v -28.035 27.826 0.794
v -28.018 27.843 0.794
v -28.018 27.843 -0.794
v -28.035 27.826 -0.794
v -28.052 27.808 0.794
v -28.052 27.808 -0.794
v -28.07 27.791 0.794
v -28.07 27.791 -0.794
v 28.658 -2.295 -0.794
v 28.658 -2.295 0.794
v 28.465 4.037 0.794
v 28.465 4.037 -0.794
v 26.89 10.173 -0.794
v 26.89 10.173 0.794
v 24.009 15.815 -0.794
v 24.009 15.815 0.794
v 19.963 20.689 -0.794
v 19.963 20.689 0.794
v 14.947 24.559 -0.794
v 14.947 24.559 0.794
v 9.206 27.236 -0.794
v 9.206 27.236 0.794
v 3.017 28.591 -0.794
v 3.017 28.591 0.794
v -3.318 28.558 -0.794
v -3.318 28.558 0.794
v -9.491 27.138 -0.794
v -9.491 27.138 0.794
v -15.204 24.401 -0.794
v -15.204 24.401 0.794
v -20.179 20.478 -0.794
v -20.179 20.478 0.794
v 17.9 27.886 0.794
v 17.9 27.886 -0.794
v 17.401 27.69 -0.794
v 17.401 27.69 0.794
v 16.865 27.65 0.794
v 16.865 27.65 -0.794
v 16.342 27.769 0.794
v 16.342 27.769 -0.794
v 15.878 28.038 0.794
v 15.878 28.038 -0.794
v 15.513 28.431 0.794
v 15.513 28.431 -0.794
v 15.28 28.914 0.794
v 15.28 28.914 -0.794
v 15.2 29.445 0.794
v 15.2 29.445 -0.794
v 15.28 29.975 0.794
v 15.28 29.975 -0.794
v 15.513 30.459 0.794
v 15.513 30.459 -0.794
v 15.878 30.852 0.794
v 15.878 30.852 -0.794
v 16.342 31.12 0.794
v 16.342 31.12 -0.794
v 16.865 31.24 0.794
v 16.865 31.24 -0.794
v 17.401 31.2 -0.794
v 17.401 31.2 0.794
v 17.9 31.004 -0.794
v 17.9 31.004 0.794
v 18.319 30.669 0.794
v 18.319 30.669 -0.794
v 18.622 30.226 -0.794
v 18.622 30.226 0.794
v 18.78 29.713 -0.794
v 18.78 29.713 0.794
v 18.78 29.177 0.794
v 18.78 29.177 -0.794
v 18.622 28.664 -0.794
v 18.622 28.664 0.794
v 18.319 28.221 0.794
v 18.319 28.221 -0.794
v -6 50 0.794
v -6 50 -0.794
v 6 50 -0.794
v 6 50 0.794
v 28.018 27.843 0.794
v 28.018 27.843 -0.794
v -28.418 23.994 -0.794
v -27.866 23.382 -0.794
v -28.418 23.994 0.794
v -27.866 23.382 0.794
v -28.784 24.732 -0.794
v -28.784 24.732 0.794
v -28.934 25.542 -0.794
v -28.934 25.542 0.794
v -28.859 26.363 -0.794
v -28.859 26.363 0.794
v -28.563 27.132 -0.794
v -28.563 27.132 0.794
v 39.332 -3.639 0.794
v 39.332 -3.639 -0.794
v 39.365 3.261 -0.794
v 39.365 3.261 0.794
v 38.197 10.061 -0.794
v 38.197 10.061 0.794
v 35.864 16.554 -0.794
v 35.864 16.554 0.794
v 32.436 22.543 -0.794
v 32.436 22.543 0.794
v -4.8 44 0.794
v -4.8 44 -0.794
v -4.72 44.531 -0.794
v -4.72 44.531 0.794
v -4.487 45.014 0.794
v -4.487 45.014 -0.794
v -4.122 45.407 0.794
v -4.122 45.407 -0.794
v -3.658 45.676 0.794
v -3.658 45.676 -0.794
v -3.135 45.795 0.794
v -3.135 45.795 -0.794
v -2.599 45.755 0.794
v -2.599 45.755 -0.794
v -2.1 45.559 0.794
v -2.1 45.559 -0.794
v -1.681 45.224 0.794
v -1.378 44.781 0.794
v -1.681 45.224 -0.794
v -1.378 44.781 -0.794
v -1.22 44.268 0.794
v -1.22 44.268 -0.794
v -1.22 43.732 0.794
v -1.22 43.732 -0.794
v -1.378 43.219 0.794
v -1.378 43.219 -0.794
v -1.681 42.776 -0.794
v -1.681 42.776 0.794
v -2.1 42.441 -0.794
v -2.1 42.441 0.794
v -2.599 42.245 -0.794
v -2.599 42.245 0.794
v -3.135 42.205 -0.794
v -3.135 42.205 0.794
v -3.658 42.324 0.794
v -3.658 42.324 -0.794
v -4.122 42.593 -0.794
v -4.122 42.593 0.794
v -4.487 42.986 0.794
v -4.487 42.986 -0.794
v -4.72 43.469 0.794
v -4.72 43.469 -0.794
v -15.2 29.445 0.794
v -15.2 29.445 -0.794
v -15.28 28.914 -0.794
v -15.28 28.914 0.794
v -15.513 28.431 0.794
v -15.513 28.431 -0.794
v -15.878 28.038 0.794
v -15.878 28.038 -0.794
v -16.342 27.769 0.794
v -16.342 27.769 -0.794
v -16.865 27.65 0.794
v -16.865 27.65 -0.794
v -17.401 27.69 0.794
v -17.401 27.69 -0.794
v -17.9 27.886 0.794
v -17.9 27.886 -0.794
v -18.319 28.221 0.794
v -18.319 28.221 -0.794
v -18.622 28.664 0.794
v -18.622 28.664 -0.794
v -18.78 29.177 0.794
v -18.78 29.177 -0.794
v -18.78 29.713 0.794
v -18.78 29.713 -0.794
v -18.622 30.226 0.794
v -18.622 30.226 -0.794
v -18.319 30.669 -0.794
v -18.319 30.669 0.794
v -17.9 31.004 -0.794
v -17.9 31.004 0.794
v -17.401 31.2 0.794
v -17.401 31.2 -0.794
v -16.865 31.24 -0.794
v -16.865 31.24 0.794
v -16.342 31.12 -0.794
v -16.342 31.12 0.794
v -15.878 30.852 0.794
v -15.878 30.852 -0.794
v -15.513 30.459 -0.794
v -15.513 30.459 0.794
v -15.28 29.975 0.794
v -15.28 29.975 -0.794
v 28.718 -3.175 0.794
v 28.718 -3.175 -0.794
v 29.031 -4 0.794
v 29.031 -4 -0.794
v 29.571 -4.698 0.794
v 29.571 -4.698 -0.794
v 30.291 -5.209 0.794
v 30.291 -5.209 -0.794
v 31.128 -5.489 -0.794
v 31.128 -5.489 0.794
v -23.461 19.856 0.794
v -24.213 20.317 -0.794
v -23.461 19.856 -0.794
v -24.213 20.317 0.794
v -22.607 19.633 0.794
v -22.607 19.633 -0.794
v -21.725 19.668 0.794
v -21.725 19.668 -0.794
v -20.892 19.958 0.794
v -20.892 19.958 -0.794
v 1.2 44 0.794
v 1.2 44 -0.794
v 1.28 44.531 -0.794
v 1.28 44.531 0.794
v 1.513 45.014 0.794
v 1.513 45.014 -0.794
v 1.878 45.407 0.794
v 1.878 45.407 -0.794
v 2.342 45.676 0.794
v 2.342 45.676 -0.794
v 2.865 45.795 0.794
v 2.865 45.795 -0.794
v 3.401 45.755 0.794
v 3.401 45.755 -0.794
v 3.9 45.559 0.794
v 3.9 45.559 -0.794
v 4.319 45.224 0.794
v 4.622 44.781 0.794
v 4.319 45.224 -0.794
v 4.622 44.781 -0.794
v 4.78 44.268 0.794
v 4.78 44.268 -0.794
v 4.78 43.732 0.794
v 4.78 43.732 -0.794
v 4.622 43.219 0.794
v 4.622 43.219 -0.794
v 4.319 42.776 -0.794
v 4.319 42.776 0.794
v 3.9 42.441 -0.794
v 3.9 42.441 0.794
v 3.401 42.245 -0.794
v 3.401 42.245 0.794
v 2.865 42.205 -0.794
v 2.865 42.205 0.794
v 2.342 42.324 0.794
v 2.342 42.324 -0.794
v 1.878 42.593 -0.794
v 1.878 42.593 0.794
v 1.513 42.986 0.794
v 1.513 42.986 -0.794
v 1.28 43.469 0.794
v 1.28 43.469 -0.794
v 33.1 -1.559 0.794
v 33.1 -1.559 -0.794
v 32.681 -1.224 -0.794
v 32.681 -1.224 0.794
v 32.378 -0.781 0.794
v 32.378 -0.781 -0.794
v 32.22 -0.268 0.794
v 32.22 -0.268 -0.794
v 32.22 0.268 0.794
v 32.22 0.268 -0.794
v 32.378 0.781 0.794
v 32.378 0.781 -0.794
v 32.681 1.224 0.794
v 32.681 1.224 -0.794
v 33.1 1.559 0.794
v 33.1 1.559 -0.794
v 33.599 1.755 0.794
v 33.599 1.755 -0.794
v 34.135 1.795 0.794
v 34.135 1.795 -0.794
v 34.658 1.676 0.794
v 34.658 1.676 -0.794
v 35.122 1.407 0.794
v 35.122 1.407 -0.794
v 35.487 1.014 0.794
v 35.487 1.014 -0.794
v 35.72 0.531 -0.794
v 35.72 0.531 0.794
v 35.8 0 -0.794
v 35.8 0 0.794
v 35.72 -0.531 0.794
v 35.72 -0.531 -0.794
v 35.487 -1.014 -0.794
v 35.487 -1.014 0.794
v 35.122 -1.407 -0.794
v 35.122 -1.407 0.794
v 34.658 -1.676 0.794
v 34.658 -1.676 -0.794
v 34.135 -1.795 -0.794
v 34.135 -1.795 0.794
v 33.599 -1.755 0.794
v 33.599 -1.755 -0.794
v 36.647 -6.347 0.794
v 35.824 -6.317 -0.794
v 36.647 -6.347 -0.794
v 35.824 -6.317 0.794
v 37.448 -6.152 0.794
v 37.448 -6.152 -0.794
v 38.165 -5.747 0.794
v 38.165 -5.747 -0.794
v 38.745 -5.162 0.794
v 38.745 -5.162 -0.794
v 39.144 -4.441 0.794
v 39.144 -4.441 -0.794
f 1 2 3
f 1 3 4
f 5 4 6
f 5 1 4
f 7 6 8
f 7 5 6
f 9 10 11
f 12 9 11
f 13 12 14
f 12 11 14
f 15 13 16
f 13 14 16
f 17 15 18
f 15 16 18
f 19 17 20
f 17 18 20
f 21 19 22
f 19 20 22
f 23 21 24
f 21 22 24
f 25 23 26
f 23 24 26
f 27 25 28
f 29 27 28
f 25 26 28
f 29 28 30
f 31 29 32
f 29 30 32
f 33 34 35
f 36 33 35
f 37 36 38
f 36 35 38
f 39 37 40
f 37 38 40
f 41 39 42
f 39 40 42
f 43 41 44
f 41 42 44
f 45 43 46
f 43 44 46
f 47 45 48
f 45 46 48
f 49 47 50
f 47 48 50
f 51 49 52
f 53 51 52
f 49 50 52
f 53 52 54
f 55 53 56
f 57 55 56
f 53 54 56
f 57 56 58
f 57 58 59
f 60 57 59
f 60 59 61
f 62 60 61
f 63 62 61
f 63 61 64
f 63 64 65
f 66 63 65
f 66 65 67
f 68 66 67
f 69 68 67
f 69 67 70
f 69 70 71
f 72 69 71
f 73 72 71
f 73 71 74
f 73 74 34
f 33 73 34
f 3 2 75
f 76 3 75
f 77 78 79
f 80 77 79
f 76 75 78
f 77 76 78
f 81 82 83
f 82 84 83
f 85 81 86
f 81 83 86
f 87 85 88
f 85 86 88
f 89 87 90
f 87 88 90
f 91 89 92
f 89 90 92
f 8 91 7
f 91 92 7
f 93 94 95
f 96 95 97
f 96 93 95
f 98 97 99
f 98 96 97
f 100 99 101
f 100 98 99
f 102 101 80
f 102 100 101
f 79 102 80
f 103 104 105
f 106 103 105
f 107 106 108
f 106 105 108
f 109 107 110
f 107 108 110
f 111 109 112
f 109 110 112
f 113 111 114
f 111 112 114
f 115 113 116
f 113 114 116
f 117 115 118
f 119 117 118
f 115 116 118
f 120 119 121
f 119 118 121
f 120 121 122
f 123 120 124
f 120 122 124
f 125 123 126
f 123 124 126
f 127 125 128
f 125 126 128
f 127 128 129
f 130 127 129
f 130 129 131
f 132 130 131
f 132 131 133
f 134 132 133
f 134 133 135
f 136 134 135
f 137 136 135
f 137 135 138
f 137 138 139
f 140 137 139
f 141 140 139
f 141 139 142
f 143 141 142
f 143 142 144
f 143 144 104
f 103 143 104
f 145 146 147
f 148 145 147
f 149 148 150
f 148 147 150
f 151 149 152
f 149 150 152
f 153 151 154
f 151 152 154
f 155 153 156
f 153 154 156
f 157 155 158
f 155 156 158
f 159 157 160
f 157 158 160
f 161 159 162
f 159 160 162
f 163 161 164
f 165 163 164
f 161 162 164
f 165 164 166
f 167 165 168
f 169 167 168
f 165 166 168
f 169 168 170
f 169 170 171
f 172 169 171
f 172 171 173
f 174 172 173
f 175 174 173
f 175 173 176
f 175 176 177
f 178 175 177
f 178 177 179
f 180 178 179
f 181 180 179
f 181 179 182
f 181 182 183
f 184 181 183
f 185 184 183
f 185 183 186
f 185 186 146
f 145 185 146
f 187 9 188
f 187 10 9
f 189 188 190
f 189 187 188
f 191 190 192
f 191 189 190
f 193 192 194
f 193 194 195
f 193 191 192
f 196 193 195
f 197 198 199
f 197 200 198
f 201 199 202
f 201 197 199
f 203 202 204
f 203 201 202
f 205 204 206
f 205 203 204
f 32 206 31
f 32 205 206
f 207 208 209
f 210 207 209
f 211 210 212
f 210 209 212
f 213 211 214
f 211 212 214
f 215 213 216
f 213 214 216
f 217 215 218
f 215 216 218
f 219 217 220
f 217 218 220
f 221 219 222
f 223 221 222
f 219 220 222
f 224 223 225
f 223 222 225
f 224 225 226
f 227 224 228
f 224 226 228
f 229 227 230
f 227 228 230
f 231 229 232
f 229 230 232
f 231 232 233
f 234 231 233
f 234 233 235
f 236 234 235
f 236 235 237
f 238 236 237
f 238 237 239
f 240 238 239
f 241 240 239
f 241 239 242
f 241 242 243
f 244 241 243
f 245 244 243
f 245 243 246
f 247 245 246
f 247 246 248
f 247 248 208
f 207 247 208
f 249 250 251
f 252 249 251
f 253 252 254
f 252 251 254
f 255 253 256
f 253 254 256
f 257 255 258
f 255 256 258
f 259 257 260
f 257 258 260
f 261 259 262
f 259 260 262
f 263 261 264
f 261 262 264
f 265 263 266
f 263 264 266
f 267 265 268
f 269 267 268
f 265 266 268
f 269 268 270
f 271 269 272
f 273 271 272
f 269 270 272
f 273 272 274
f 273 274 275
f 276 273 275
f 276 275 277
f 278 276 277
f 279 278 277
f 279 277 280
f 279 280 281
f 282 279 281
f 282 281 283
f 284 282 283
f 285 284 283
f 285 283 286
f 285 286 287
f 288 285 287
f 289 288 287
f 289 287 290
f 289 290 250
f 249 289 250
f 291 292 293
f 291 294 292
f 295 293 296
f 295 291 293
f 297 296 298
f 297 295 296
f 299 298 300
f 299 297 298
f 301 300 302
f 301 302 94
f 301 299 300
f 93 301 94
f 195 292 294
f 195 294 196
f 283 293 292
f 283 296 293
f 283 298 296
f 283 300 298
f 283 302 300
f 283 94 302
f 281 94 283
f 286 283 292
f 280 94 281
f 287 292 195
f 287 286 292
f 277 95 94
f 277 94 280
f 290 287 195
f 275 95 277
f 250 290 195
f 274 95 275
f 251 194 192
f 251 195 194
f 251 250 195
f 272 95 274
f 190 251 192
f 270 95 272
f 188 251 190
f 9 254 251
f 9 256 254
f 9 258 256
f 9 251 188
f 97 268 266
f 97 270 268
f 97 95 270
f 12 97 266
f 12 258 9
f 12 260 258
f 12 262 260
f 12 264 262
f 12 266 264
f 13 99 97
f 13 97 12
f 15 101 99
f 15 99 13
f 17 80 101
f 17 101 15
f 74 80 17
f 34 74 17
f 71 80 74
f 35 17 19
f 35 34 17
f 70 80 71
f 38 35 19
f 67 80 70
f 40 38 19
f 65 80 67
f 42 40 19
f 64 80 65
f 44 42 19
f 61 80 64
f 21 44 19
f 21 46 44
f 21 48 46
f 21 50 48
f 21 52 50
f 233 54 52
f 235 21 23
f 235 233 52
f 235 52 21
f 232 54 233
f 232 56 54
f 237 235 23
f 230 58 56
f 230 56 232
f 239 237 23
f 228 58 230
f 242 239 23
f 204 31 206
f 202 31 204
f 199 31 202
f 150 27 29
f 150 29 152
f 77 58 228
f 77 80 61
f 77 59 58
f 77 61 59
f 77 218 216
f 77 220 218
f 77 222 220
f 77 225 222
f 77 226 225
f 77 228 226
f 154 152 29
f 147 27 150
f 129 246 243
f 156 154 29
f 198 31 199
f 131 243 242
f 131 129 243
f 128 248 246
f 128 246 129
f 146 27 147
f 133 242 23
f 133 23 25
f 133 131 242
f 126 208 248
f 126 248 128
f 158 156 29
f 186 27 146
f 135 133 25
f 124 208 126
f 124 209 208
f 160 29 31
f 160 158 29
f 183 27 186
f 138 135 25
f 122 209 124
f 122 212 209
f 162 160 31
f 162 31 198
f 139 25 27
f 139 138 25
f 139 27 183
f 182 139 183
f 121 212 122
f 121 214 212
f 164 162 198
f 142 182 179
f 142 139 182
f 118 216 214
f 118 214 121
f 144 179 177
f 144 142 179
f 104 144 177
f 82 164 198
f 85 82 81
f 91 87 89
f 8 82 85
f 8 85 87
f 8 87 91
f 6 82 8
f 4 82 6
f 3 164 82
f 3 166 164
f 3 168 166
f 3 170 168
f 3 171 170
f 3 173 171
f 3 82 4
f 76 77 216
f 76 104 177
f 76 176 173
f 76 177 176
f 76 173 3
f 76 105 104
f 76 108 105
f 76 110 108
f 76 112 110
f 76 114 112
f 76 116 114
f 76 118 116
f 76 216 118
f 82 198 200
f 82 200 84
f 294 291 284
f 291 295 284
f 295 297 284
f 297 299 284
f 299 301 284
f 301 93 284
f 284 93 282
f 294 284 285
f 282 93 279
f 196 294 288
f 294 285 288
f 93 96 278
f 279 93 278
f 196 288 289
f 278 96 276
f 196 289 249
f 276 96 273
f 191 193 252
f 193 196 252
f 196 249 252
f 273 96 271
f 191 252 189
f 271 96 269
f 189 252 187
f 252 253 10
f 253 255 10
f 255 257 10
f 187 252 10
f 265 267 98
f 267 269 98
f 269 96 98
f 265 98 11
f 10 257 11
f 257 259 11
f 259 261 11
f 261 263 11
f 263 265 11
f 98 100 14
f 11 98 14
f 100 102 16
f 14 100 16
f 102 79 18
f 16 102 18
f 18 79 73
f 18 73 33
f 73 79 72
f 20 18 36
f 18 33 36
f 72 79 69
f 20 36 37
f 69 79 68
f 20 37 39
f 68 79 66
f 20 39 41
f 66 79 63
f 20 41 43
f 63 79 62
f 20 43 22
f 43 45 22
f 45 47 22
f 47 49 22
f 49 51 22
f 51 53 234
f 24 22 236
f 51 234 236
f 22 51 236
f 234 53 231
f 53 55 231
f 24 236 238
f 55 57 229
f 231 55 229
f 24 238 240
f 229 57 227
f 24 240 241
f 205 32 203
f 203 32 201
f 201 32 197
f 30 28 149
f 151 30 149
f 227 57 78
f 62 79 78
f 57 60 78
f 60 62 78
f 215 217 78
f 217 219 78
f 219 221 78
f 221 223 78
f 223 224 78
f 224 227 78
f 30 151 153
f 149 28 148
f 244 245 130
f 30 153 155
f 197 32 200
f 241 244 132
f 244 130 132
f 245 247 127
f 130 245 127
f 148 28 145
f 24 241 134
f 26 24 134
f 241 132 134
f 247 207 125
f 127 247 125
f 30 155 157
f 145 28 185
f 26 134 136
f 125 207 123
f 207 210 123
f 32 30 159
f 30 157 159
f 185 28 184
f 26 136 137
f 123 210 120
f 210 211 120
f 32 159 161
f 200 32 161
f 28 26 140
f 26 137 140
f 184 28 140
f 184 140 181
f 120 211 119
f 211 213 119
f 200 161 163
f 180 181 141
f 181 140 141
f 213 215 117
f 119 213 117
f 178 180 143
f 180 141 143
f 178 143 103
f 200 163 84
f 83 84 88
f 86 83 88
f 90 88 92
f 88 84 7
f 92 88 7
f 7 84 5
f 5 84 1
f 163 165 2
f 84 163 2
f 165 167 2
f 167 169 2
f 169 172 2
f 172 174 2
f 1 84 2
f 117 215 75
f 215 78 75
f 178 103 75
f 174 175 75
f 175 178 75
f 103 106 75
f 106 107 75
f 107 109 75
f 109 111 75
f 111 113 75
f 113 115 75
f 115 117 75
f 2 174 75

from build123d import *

# Parameters (mm, degrees)
SKETCH1_R                = 39.5
BOSS_EXTRUDE1_DEPTH      = 0.79375
BOSS_EXTRUDE2_DEPTH      = 1.5875
SKETCH2_R                = 28.75
CUT_EXTRUDE1_DEPTH       = 64.739863165
M3_CLEARANCE_HOLE1_D     = 3.6
CIRPATTERN1_COUNT        = 6
M3_CLEARANCE_HOLE2_D     = 3.6
M3_CLEARANCE_HOLE2_DEPTH = 10
M3_CLEARANCE_HOLE2_TIP   = 1.081549114
CUT_EXTRUDE3_DEPTH       = 64.739863165
FILLET1_R                = 3


with BuildPart() as part:
    # Sketch1 → Boss-Extrude1 (new, symmetric)
    with BuildSketch(Plane.XY):
        Circle(SKETCH1_R)
    extrude(amount=BOSS_EXTRUDE1_DEPTH, both=True)

    # Sketch3 → Boss-Extrude2 (add, through all)
    with BuildSketch(Plane.XY.offset(0.79375)):
        Polygon((-28.01836343, 27.842796388), (-6, 50), (6, 50), (28.01836343, 27.842796388), align=None)
    extrude(amount=-BOSS_EXTRUDE2_DEPTH)

    # Sketch2 → Cut-Extrude1 (cut, through all)
    with BuildSketch(Plane.XY.offset(0.79375)):
        Circle(SKETCH2_R)
    extrude(amount=-CUT_EXTRUDE1_DEPTH, mode=Mode.SUBTRACT)

    # M3 Clearance Hole1 (through all)
    with Locations(Plane.XY.offset(0.79375)):
        with Locations((17, -29.444863729)):
            m3_clearance_hole1 = Hole(M3_CLEARANCE_HOLE1_D / 2)

    # CirPattern1: M3 Clearance Hole1 ×6 about axis
    cirpattern1_axis = Axis((0, 0, 0), (0, 0, 1))
    for i in range(1, CIRPATTERN1_COUNT):
        add(m3_clearance_hole1.rotate(cirpattern1_axis, i * 360 / CIRPATTERN1_COUNT), mode=Mode.SUBTRACT)

    # M3 Clearance Hole2
    with Locations(Plane.XY.offset(0.79375)):
        with Locations((3, 44), (-3, 44)):
            Hole(M3_CLEARANCE_HOLE2_D / 2, depth=M3_CLEARANCE_HOLE2_DEPTH)
            with Locations((0, 0, -(M3_CLEARANCE_HOLE2_DEPTH + M3_CLEARANCE_HOLE2_TIP / 2))):  # 118° drill point
                Cone(0, M3_CLEARANCE_HOLE2_D / 2, M3_CLEARANCE_HOLE2_TIP, mode=Mode.SUBTRACT)

    # OpenEdge → Cut-Extrude3 (cut, through all)
    with BuildSketch(Plane(origin=(0, 0, -0.79375), x_dir=(-1, 0, 0), z_dir=(0, 0, -1))):
        with BuildLine():
            Line((22.02377774, 18.480143778), (30.258755503, 25.390110583))
            ThreePointArc((30.258755503, 25.390110583), (16.693421339, -35.799157588), (-38.899906244, -6.859103018))
            Line((-38.899906244, -6.859103018), (-28.313222899, -4.992385108))
            ThreePointArc((-28.313222899, -4.992385108), (12.150275025, -26.056348877), (22.02377774, 18.480143778))
        make_face()
    extrude(amount=-CUT_EXTRUDE3_DEPTH, mode=Mode.SUBTRACT)

    # Fillet1
    fillet1_edges = [part.edges().sort_by_distance(p)[0] for p in [
        (28.313222899, -4.992385108, 0),
        (-22.02377774, 18.480143778, 0),
        (-30.258755503, 25.390110583, 0),
        (38.899906244, -6.859103018, 0),
    ]]
    fillet(fillet1_edges, radius=FILLET1_R)


solid = part.part
